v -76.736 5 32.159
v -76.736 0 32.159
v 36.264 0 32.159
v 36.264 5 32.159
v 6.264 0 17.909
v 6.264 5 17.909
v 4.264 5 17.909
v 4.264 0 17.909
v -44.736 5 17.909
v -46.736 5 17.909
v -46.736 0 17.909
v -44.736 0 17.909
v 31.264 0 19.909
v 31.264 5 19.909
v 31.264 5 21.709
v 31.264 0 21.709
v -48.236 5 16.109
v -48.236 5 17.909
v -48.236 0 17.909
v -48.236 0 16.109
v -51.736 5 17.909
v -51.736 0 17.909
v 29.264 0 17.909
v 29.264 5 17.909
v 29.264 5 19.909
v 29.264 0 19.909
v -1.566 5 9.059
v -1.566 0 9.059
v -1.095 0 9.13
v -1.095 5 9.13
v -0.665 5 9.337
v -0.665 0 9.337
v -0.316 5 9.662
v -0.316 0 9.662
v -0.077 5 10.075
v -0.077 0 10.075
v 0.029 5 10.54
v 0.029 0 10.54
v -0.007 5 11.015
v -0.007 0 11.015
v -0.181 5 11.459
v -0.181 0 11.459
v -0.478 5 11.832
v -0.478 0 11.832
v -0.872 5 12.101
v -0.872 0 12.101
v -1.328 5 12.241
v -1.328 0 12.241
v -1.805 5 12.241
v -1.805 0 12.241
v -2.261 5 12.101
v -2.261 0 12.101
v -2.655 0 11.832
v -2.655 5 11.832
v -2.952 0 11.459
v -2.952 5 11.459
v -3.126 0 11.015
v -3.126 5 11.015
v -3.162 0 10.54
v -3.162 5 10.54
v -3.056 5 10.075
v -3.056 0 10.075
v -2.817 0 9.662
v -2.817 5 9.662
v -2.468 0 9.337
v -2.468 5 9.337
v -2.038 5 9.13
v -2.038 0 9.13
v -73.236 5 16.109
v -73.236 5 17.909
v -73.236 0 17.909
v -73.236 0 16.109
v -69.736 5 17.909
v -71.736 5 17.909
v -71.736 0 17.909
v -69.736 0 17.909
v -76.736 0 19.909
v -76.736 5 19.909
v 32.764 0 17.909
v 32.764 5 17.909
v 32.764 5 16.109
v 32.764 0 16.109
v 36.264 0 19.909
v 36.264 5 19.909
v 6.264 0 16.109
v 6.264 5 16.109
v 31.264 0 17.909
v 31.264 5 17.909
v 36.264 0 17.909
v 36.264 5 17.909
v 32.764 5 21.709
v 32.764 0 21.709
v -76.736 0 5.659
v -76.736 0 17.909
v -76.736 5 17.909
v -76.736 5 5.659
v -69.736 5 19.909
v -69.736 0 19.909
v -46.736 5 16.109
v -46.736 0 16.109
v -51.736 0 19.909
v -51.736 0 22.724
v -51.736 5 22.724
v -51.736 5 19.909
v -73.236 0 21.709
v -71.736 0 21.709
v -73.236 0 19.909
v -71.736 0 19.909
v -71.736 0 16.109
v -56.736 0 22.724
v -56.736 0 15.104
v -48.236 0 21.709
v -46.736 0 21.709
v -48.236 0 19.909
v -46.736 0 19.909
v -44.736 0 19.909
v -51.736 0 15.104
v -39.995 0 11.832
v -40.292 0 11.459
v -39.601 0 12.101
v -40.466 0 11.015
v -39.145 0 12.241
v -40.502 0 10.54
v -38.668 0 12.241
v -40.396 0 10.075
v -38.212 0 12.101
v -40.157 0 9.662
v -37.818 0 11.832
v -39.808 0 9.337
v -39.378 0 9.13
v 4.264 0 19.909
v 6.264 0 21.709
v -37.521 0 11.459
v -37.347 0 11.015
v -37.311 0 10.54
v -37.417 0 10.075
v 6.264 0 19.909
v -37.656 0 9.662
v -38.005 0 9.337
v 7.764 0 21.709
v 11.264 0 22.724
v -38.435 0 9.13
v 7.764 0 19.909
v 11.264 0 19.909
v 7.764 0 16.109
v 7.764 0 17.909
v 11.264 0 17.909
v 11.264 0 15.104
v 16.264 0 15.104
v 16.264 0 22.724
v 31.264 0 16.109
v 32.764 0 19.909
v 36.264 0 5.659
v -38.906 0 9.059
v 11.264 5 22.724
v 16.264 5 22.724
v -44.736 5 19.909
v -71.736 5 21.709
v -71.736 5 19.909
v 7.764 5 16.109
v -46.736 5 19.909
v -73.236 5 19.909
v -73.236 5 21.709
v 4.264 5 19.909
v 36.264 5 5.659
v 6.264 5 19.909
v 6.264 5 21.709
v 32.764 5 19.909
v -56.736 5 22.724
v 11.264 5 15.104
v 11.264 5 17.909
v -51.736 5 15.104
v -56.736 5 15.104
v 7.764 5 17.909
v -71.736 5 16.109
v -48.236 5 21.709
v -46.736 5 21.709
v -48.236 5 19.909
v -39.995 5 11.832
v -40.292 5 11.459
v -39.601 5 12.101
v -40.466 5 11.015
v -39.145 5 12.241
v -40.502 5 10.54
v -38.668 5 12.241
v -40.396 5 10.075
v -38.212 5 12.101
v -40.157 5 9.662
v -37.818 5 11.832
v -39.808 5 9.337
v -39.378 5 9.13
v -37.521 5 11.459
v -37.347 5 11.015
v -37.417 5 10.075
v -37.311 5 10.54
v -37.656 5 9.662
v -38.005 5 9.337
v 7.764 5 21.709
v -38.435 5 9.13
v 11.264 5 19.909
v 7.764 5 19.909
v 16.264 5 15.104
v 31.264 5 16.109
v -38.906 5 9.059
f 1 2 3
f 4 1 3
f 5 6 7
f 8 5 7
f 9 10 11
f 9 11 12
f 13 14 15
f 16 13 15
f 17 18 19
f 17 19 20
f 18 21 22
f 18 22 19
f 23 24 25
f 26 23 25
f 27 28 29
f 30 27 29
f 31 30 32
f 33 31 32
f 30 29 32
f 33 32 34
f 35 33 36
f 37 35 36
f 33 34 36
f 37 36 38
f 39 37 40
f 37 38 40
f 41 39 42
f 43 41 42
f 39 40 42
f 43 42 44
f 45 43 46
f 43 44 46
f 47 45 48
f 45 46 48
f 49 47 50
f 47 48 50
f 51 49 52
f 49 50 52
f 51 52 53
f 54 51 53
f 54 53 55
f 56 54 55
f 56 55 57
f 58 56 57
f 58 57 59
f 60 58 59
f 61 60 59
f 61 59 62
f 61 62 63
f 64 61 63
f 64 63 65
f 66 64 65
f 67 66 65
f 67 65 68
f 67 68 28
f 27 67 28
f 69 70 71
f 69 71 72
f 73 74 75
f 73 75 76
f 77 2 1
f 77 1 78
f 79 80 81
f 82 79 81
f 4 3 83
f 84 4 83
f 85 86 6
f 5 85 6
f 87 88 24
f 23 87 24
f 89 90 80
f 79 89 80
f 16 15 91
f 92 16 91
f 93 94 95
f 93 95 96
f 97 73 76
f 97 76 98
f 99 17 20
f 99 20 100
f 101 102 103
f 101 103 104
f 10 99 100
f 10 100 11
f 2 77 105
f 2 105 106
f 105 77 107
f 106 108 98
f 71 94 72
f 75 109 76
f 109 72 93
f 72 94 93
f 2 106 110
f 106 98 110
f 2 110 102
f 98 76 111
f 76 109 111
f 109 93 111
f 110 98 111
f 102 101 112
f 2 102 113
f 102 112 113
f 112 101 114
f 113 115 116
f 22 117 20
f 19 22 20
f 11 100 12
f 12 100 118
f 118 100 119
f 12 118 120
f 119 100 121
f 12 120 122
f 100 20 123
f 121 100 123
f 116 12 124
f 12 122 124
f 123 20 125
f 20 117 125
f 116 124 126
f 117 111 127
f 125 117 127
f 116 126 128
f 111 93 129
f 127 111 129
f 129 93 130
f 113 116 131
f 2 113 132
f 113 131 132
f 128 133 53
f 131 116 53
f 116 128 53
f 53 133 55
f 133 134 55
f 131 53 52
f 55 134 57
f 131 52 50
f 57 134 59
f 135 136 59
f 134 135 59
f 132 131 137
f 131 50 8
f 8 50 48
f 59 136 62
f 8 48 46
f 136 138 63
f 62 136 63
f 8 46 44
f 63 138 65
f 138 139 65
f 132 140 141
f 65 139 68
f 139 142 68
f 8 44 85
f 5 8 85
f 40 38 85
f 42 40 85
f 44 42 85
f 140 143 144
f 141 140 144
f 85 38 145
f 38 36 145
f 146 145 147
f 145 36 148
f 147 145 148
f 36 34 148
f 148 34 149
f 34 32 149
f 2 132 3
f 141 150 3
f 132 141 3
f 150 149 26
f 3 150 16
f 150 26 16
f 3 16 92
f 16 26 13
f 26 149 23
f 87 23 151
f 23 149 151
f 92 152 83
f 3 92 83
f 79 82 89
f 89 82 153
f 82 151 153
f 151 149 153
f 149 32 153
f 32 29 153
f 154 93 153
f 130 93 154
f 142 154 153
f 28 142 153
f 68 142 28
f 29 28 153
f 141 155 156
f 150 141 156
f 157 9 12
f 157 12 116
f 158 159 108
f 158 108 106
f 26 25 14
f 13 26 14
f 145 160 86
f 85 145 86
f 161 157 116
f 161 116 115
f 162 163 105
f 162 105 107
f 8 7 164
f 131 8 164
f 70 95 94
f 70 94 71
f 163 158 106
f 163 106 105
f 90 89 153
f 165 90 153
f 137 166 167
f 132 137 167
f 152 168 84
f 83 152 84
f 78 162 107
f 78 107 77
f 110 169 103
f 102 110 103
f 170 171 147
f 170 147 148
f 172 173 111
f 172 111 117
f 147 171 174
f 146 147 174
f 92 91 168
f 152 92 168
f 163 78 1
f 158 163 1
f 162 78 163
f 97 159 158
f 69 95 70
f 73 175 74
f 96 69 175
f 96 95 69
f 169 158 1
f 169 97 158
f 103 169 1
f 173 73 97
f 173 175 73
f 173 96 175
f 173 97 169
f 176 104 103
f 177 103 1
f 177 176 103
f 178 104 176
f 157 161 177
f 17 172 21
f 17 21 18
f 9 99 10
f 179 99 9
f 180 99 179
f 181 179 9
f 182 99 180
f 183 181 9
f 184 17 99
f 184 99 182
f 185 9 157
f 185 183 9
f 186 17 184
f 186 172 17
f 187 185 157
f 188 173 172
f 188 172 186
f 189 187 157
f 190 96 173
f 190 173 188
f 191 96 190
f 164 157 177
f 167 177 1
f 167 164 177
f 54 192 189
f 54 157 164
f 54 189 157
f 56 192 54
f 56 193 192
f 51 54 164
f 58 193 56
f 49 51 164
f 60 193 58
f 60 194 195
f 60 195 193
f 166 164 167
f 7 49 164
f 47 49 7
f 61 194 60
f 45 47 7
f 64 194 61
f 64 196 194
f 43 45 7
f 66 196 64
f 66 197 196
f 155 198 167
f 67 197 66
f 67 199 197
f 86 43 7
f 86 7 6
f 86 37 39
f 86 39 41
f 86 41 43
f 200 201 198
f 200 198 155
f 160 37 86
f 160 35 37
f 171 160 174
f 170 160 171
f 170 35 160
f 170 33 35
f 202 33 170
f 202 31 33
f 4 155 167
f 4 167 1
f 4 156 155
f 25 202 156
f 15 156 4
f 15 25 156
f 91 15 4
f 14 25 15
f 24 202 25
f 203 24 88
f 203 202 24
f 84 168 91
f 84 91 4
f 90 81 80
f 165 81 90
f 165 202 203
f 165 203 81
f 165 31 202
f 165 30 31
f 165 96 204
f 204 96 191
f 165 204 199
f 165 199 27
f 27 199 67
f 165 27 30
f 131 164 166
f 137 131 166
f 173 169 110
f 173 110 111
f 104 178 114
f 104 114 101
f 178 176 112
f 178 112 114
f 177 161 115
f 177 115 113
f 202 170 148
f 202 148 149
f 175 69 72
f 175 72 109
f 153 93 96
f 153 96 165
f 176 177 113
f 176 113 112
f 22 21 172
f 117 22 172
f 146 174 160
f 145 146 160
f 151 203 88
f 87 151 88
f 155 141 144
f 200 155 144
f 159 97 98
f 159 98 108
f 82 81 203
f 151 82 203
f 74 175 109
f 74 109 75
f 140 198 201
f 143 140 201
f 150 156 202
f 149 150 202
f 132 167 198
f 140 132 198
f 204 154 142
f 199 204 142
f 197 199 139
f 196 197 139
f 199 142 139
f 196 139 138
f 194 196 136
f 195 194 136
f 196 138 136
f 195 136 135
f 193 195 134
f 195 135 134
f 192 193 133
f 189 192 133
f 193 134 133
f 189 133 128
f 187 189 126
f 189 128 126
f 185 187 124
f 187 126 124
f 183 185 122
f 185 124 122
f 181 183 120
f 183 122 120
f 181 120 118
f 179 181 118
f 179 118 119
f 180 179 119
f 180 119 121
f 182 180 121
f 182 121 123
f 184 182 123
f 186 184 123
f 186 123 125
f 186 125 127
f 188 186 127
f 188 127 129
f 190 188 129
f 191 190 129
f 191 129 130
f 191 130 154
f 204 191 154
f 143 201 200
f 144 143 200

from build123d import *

# Parameters (mm, degrees)
ESBO_O1_W                = 113
ESBO_O1_H                = 26.5
RESSALTO_EXTRUS_O1_DEPTH = 5
ESBO_O2_W                = 5
ESBO_O2_H                = 7.62
CORTE_EXTRUS_O1_DEPTH    = 5
CORTE_EXTRUS_O2_DEPTH    = 5
ESBO_O4_R                = 1.6
CORTE_EXTRUS_O3_DEPTH    = 10


with BuildPart() as part:
    # Esboço1 → Ressalto-extrusão1 (new body)
    with BuildSketch(Plane(origin=(0, 0, 0), x_dir=(1, 0, 0), z_dir=(0, 1, 0))):
        with Locations((-20.23644711, -18.909257917)):
            Rectangle(ESBO_O1_W, ESBO_O1_H)
    extrude(amount=RESSALTO_EXTRUS_O1_DEPTH)

    # Esboço2 → Corte-extrusão1 (cut)
    with BuildSketch(Plane(origin=(0, 5, 0), x_dir=(1, 0, 0), z_dir=(0, 1, 0))):
        with Locations((13.76355289, -18.914257917)):
            Rectangle(ESBO_O2_W, ESBO_O2_H)
        with Locations((-54.23644711, -18.914257917)):
            Rectangle(ESBO_O2_W, ESBO_O2_H)
    extrude(amount=-CORTE_EXTRUS_O1_DEPTH, mode=Mode.SUBTRACT)

    # Esboço3 → Corte-extrusão2 (cut)
    with BuildSketch(Plane(origin=(0, 5, 0), x_dir=(1, 0, 0), z_dir=(0, 1, 0))):
        Polygon((-76.73644711, -17.909257917), (-73.23644711, -17.909257917), (-73.23644711, -16.109257917), (-71.73644711, -16.109257917), (-71.73644711, -17.909257917), (-69.73644711, -17.909257917), (-69.73644711, -19.909257917), (-71.73644711, -19.909257917), (-71.73644711, -21.709257917), (-73.23644711, -21.709257917), (-73.23644711, -19.909257917), (-76.73644711, -19.909257917), align=None)
        Polygon((-51.73644711, -17.909257917), (-48.23644711, -17.909257917), (-48.23644711, -16.109257917), (-46.73644711, -16.109257917), (-46.73644711, -17.909257917), (-44.73644711, -17.909257917), (-44.73644711, -19.909257917), (-46.73644711, -19.909257917), (-46.73644711, -21.709257917), (-48.23644711, -21.709257917), (-48.23644711, -19.909257917), (-51.73644711, -19.909257917), align=None)
    corte_extrus_o2 = extrude(amount=-CORTE_EXTRUS_O2_DEPTH, mode=Mode.SUBTRACT)

    # Espelhar1: Corte-extrusão2 across plane
    add(corte_extrus_o2.mirror(Plane.ZY.offset(20.23644711)), mode=Mode.SUBTRACT)

    # Esboço4 → Corte-extrusão3 (cut)
    with BuildSketch(Plane(origin=(0, 0, 0), x_dir=(-1, 0, 0), z_dir=(0, -1, 0))):
        with Locations(Location((1.56644711, -10.659257917, 0), (0, 0, 90))):
            Circle(ESBO_O4_R)
        with Locations(Location((38.90644711, -10.659257917, 0), (0, 0, 90))):
            Circle(ESBO_O4_R)
    extrude(amount=-CORTE_EXTRUS_O3_DEPTH, mode=Mode.SUBTRACT)


solid = part.part
